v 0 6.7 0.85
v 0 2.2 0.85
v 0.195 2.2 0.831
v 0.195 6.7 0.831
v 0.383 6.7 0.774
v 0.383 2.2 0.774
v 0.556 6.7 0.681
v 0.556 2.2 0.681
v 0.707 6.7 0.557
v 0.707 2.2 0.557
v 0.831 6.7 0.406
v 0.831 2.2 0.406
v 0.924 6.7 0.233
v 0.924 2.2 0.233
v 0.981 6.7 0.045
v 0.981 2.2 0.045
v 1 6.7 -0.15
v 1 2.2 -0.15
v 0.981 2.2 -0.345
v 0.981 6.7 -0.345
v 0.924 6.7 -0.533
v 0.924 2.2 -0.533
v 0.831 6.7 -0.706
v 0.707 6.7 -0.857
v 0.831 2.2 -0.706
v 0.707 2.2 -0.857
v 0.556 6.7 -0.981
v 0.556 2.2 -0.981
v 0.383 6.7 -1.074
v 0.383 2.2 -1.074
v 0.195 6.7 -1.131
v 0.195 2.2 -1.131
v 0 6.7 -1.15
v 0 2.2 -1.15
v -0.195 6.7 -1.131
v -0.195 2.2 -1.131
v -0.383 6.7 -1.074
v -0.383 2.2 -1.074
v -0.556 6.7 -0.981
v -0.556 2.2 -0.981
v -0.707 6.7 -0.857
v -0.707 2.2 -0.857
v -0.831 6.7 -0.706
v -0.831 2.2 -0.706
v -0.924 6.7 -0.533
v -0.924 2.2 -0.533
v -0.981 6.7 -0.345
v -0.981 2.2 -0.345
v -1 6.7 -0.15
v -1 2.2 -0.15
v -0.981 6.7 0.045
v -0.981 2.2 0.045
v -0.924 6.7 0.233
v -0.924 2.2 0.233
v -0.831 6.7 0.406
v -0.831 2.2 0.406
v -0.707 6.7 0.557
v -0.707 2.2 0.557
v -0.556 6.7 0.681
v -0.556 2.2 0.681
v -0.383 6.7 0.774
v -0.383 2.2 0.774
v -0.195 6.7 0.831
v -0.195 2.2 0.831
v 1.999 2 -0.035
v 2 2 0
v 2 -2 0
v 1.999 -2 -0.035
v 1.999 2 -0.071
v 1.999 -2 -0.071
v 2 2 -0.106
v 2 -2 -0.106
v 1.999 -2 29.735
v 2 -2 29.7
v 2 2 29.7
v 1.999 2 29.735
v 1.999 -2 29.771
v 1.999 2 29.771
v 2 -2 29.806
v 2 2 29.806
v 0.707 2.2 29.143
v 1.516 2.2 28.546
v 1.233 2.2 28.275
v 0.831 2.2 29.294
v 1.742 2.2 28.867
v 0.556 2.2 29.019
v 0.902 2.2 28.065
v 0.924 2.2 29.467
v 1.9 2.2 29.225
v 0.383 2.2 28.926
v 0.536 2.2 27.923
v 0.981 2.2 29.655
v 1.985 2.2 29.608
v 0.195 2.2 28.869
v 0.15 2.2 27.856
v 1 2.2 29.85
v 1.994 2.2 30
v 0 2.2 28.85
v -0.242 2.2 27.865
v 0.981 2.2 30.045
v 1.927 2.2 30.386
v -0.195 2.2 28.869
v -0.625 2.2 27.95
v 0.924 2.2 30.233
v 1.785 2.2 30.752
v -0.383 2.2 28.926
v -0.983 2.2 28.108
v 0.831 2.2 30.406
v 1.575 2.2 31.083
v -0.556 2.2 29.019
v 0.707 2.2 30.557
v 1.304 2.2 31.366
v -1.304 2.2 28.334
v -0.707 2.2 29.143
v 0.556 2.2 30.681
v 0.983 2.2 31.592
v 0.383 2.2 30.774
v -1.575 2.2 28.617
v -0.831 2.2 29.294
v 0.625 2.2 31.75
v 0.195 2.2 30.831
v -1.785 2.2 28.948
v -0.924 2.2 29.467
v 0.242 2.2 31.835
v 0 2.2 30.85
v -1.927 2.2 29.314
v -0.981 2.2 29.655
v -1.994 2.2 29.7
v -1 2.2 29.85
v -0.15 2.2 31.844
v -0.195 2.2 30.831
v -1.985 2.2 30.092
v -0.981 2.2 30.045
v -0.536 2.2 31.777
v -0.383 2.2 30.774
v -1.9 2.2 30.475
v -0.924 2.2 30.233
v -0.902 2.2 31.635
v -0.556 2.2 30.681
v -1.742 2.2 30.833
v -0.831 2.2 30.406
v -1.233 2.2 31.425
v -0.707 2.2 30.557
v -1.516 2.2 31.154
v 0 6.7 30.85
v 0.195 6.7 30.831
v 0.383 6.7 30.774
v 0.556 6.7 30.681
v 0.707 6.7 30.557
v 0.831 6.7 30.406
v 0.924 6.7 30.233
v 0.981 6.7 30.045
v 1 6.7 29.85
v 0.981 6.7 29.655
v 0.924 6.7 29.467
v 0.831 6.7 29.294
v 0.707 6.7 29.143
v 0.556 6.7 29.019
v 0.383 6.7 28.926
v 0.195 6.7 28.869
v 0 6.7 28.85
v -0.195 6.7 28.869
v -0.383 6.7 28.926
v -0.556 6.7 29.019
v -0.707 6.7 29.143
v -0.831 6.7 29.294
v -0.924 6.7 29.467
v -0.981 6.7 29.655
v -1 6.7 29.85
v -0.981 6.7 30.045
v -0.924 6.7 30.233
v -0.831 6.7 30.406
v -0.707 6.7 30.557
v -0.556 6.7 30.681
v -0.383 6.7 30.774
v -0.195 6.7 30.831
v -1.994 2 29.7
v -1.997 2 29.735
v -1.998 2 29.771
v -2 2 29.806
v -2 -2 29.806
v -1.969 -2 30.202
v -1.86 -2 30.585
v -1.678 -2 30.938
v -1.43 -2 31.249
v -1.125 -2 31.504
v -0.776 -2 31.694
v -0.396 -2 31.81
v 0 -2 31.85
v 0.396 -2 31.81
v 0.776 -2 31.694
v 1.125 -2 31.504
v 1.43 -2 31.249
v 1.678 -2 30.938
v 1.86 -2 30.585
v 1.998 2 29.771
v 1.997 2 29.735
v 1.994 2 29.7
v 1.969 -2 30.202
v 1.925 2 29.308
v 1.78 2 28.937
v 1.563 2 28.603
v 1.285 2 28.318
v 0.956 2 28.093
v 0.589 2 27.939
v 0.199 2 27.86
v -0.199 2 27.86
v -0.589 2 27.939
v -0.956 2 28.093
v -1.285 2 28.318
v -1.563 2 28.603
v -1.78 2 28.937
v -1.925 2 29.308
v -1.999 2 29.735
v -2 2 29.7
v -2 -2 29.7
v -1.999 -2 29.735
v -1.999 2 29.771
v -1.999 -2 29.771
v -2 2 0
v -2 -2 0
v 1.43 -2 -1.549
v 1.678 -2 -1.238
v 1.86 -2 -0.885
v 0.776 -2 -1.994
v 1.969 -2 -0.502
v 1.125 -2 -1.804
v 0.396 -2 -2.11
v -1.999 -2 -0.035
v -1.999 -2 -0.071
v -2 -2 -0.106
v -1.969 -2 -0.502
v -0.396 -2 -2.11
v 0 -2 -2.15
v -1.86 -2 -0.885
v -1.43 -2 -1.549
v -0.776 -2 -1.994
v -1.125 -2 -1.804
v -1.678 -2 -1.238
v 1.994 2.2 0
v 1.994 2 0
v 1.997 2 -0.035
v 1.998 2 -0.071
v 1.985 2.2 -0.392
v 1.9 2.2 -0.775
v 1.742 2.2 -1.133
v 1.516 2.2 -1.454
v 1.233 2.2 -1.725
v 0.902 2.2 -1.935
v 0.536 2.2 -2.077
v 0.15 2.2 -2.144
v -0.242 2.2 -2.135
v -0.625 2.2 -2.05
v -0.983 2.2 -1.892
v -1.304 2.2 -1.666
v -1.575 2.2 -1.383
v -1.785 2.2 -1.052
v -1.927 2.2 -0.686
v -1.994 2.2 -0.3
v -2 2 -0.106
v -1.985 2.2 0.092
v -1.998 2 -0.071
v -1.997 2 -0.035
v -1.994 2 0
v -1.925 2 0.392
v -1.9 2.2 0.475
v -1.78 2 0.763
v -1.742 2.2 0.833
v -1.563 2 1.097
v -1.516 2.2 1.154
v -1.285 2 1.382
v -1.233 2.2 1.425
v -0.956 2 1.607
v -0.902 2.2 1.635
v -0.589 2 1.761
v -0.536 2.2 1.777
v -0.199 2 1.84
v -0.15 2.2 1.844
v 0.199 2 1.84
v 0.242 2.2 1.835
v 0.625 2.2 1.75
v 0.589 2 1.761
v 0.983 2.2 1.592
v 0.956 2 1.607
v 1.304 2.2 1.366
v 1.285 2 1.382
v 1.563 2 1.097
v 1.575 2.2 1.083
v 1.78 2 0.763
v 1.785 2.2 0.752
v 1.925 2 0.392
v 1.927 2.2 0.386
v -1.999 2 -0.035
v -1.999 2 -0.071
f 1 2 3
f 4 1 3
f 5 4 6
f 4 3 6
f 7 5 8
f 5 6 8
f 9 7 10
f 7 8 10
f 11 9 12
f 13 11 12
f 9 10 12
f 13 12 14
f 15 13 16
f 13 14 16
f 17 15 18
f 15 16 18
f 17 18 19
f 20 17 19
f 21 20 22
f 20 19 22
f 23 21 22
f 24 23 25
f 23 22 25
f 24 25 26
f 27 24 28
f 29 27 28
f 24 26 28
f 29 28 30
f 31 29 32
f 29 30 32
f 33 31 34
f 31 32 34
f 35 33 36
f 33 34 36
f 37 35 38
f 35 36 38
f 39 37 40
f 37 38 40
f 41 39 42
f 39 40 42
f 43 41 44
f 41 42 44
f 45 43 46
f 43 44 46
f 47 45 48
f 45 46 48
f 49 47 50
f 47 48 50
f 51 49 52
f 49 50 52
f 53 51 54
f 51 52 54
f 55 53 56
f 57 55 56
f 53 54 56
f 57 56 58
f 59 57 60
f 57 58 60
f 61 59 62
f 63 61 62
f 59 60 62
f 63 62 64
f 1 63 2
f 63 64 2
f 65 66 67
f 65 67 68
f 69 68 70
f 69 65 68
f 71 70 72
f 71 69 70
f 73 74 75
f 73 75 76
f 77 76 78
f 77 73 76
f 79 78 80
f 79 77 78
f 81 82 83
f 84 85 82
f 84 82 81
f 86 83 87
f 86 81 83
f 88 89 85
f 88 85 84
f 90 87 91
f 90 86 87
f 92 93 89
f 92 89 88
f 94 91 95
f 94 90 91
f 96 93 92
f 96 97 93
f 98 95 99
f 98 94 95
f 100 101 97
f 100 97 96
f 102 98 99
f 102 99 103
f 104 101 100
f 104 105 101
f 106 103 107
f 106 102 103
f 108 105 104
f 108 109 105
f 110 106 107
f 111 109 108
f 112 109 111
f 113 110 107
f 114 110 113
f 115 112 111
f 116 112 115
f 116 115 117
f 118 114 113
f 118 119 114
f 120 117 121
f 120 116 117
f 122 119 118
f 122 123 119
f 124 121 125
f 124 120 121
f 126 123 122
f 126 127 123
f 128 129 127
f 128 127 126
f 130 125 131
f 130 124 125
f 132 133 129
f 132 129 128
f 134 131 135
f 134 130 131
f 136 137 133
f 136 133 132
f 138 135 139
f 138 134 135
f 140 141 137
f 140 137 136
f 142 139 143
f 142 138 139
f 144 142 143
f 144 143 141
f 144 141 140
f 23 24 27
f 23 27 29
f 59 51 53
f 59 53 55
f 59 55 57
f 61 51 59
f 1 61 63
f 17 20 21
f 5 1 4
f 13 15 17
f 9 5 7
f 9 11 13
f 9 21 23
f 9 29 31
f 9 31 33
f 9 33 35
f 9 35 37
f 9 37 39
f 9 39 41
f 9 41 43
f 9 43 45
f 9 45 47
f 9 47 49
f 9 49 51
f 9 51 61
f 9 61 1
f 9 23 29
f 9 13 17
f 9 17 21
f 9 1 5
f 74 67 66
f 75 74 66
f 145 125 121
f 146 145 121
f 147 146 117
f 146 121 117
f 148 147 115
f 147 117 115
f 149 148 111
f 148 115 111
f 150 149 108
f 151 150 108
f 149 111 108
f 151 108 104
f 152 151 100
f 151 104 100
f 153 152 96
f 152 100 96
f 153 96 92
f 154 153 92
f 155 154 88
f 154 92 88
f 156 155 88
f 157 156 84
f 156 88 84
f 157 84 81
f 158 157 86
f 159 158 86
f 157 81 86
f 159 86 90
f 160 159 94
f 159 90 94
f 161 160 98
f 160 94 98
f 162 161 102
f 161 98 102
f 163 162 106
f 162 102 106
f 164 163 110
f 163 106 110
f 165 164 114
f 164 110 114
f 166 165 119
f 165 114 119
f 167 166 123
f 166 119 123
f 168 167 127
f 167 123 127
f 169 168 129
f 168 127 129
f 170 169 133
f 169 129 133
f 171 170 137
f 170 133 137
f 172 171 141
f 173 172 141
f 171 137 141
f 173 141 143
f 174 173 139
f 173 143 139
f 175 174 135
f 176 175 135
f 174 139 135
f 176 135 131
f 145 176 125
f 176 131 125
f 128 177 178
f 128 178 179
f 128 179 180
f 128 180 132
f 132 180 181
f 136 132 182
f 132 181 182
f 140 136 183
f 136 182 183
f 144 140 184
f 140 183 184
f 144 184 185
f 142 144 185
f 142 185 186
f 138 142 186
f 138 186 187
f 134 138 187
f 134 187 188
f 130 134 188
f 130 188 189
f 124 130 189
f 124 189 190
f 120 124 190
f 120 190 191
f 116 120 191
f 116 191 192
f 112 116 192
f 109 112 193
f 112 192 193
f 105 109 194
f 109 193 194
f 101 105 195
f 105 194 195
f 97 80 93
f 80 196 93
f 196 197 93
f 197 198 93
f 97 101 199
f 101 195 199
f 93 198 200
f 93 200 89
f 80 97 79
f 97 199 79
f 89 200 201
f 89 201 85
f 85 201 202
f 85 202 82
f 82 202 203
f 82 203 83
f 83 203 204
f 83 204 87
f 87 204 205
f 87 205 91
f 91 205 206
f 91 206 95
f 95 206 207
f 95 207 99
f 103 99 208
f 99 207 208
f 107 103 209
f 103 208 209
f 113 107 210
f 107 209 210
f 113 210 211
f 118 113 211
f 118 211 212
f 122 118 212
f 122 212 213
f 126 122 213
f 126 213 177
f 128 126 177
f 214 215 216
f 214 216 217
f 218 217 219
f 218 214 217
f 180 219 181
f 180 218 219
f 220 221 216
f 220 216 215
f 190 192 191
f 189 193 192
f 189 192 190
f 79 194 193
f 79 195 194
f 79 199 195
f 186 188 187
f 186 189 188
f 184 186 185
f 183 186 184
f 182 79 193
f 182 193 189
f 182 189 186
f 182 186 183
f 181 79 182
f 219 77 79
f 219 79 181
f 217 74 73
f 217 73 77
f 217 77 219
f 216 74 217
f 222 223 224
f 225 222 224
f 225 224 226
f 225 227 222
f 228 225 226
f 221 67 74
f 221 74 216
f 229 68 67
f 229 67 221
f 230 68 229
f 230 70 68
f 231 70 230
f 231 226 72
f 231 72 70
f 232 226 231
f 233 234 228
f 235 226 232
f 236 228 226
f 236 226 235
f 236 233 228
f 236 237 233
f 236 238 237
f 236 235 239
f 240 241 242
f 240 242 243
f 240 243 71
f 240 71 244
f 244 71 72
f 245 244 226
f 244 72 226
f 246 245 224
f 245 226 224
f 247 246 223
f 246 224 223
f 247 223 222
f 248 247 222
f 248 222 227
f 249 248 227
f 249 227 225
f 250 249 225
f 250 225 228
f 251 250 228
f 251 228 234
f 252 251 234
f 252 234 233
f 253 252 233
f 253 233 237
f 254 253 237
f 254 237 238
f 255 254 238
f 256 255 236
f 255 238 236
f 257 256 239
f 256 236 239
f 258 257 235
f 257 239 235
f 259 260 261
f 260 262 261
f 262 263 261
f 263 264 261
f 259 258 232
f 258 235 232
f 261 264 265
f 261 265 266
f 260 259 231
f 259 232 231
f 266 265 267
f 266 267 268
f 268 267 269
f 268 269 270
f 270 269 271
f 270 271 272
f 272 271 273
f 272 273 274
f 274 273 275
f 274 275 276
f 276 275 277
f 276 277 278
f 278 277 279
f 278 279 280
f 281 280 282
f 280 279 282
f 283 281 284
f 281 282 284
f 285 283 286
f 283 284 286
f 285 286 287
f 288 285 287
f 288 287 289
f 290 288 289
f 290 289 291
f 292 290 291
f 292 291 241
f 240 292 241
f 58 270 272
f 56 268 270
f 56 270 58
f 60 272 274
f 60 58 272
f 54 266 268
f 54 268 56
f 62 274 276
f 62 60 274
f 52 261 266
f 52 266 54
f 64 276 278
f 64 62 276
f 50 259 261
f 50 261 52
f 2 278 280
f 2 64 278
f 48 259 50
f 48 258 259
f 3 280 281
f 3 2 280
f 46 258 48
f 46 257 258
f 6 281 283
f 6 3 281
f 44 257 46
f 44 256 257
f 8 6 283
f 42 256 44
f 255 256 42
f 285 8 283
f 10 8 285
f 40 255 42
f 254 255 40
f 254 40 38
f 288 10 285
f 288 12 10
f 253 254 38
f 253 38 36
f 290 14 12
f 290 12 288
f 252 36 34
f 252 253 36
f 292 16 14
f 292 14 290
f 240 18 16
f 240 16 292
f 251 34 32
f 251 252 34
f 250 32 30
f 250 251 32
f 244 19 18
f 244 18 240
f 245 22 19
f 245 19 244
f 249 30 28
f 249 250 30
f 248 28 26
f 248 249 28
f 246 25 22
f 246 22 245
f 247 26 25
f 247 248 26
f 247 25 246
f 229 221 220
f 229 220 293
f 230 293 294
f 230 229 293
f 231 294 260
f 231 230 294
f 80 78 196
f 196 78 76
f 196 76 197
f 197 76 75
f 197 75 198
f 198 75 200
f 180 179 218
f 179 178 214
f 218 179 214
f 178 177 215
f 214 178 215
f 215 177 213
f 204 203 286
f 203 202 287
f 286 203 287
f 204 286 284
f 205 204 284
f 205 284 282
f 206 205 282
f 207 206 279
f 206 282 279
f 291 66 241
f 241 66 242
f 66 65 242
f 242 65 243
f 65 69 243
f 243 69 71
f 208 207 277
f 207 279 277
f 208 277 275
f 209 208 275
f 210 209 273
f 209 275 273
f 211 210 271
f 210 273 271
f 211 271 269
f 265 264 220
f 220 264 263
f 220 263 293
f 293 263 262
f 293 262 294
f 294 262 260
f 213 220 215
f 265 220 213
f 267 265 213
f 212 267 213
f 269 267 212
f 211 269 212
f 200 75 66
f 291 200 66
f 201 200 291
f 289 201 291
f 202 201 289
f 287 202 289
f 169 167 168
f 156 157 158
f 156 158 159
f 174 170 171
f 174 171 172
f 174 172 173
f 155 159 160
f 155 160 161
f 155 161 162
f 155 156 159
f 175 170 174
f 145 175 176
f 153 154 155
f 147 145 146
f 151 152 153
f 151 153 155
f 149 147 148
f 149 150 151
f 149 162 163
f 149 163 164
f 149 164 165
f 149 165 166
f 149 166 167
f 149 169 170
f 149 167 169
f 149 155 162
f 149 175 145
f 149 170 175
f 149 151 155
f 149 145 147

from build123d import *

# Parameters (mm, degrees)
SKIZZE1_W                            = 4
SKIZZE1_H                            = 4
AUFSATZ_LINEAR_AUSTRAGEN1_DEPTH      = 29.7
AUFSATZ_LINEAR_AUSTRAGEN2_DEPTH      = 0.2
AUFSATZ_LINEAR_AUSTRAGEN2_DEPTH_BACK = 4
AUFSATZ_LINEAR_AUSTRAGEN2_START      = 2
SKIZZE2_R                            = 2
SKIZZE3_R                            = 1
AUFSATZ_LINEAR_AUSTRAGEN4_DEPTH      = 4.5
VERRUNDUNG1_R                        = 2


with BuildPart() as part:
    # Skizze1 → Aufsatz-Linear austragen1 (new body)
    with BuildSketch(Plane.XY):
        Rectangle(SKIZZE1_W, SKIZZE1_H)
    extrude(amount=AUFSATZ_LINEAR_AUSTRAGEN1_DEPTH)

    # Skizze2 → Aufsatz-Linear austragen2 (add, two sides: drawn at the far end of the back side and taken through both)
    with BuildSketch(Plane(origin=(0, 0, 0), x_dir=(1, 0, 0), z_dir=(0, 1, 0)).offset(AUFSATZ_LINEAR_AUSTRAGEN2_START - AUFSATZ_LINEAR_AUSTRAGEN2_DEPTH_BACK)):
        with Locations(Location((0, -29.85, 0), (0, 0, 175.698777695))):
            Circle(SKIZZE2_R)
        with Locations(Location((0, 0.15, 0), (0, 0, 355.698777695))):
            Circle(SKIZZE2_R)
    extrude(amount=AUFSATZ_LINEAR_AUSTRAGEN2_DEPTH + AUFSATZ_LINEAR_AUSTRAGEN2_DEPTH_BACK)

    # Skizze3 → Aufsatz-Linear austragen4 (add)
    with BuildSketch(Plane(origin=(0, 2.2, 0), x_dir=(1, 0, 0), z_dir=(0, 1, 0))):
        with Locations(Location((0, -29.85, 0), (0, 0, 270))):
            Circle(SKIZZE3_R)
        with Locations(Location((0, 0.15, 0), (0, 0, 270))):
            Circle(SKIZZE3_R)
    extrude(amount=AUFSATZ_LINEAR_AUSTRAGEN4_DEPTH)

    # Verrundung1
    # the kernel refuses this fillet: 2 mm, written as the material it adds along each edge
    with BuildSketch(Plane(origin=(-1.994367068, 2, 29.7), x_dir=(-0.048500864171623644, 0, 0.9988231405882653), z_dir=(0, -1, 0)), Plane(origin=(1.994367068, 2, 0), x_dir=(0.04850086417162046, 0, -0.9988231405882655), z_dir=(0, -1, 0))) as verrundung1_piece_1:
        with BuildLine():
            CenterArc((0.159284835, 1.999295107), VERRUNDUNG1_R, 265.439839389, 3.038923762)
            Line((0.000273202, 0.005626303), (0, 0))
            ThreePointArc((0, 0), (0.053094945, 0.000704893), (0.10618989, 0))
        make_face()
    extrude(amount=4)
    with BuildSketch(Plane(origin=(1.994367068, -2, 29.7), x_dir=(1, 0, 0), z_dir=(0, 1, 0)), Plane(origin=(-1.994367068, -2, 0), x_dir=(-1, 0, 0), z_dir=(0, 1, 0))) as verrundung1_piece_2:
        with BuildLine():
            CenterArc((2.00466767, -0.062129838), VERRUNDUNG1_R, 178.219824845, 3.038923762)
            ThreePointArc((0.005150301, -0.106064919), (0.003279214, -0.052998272), (0, 0))
            Line((0, 0), (0.005632932, 0))
        make_face()
    extrude(amount=4)


solid = part.part
